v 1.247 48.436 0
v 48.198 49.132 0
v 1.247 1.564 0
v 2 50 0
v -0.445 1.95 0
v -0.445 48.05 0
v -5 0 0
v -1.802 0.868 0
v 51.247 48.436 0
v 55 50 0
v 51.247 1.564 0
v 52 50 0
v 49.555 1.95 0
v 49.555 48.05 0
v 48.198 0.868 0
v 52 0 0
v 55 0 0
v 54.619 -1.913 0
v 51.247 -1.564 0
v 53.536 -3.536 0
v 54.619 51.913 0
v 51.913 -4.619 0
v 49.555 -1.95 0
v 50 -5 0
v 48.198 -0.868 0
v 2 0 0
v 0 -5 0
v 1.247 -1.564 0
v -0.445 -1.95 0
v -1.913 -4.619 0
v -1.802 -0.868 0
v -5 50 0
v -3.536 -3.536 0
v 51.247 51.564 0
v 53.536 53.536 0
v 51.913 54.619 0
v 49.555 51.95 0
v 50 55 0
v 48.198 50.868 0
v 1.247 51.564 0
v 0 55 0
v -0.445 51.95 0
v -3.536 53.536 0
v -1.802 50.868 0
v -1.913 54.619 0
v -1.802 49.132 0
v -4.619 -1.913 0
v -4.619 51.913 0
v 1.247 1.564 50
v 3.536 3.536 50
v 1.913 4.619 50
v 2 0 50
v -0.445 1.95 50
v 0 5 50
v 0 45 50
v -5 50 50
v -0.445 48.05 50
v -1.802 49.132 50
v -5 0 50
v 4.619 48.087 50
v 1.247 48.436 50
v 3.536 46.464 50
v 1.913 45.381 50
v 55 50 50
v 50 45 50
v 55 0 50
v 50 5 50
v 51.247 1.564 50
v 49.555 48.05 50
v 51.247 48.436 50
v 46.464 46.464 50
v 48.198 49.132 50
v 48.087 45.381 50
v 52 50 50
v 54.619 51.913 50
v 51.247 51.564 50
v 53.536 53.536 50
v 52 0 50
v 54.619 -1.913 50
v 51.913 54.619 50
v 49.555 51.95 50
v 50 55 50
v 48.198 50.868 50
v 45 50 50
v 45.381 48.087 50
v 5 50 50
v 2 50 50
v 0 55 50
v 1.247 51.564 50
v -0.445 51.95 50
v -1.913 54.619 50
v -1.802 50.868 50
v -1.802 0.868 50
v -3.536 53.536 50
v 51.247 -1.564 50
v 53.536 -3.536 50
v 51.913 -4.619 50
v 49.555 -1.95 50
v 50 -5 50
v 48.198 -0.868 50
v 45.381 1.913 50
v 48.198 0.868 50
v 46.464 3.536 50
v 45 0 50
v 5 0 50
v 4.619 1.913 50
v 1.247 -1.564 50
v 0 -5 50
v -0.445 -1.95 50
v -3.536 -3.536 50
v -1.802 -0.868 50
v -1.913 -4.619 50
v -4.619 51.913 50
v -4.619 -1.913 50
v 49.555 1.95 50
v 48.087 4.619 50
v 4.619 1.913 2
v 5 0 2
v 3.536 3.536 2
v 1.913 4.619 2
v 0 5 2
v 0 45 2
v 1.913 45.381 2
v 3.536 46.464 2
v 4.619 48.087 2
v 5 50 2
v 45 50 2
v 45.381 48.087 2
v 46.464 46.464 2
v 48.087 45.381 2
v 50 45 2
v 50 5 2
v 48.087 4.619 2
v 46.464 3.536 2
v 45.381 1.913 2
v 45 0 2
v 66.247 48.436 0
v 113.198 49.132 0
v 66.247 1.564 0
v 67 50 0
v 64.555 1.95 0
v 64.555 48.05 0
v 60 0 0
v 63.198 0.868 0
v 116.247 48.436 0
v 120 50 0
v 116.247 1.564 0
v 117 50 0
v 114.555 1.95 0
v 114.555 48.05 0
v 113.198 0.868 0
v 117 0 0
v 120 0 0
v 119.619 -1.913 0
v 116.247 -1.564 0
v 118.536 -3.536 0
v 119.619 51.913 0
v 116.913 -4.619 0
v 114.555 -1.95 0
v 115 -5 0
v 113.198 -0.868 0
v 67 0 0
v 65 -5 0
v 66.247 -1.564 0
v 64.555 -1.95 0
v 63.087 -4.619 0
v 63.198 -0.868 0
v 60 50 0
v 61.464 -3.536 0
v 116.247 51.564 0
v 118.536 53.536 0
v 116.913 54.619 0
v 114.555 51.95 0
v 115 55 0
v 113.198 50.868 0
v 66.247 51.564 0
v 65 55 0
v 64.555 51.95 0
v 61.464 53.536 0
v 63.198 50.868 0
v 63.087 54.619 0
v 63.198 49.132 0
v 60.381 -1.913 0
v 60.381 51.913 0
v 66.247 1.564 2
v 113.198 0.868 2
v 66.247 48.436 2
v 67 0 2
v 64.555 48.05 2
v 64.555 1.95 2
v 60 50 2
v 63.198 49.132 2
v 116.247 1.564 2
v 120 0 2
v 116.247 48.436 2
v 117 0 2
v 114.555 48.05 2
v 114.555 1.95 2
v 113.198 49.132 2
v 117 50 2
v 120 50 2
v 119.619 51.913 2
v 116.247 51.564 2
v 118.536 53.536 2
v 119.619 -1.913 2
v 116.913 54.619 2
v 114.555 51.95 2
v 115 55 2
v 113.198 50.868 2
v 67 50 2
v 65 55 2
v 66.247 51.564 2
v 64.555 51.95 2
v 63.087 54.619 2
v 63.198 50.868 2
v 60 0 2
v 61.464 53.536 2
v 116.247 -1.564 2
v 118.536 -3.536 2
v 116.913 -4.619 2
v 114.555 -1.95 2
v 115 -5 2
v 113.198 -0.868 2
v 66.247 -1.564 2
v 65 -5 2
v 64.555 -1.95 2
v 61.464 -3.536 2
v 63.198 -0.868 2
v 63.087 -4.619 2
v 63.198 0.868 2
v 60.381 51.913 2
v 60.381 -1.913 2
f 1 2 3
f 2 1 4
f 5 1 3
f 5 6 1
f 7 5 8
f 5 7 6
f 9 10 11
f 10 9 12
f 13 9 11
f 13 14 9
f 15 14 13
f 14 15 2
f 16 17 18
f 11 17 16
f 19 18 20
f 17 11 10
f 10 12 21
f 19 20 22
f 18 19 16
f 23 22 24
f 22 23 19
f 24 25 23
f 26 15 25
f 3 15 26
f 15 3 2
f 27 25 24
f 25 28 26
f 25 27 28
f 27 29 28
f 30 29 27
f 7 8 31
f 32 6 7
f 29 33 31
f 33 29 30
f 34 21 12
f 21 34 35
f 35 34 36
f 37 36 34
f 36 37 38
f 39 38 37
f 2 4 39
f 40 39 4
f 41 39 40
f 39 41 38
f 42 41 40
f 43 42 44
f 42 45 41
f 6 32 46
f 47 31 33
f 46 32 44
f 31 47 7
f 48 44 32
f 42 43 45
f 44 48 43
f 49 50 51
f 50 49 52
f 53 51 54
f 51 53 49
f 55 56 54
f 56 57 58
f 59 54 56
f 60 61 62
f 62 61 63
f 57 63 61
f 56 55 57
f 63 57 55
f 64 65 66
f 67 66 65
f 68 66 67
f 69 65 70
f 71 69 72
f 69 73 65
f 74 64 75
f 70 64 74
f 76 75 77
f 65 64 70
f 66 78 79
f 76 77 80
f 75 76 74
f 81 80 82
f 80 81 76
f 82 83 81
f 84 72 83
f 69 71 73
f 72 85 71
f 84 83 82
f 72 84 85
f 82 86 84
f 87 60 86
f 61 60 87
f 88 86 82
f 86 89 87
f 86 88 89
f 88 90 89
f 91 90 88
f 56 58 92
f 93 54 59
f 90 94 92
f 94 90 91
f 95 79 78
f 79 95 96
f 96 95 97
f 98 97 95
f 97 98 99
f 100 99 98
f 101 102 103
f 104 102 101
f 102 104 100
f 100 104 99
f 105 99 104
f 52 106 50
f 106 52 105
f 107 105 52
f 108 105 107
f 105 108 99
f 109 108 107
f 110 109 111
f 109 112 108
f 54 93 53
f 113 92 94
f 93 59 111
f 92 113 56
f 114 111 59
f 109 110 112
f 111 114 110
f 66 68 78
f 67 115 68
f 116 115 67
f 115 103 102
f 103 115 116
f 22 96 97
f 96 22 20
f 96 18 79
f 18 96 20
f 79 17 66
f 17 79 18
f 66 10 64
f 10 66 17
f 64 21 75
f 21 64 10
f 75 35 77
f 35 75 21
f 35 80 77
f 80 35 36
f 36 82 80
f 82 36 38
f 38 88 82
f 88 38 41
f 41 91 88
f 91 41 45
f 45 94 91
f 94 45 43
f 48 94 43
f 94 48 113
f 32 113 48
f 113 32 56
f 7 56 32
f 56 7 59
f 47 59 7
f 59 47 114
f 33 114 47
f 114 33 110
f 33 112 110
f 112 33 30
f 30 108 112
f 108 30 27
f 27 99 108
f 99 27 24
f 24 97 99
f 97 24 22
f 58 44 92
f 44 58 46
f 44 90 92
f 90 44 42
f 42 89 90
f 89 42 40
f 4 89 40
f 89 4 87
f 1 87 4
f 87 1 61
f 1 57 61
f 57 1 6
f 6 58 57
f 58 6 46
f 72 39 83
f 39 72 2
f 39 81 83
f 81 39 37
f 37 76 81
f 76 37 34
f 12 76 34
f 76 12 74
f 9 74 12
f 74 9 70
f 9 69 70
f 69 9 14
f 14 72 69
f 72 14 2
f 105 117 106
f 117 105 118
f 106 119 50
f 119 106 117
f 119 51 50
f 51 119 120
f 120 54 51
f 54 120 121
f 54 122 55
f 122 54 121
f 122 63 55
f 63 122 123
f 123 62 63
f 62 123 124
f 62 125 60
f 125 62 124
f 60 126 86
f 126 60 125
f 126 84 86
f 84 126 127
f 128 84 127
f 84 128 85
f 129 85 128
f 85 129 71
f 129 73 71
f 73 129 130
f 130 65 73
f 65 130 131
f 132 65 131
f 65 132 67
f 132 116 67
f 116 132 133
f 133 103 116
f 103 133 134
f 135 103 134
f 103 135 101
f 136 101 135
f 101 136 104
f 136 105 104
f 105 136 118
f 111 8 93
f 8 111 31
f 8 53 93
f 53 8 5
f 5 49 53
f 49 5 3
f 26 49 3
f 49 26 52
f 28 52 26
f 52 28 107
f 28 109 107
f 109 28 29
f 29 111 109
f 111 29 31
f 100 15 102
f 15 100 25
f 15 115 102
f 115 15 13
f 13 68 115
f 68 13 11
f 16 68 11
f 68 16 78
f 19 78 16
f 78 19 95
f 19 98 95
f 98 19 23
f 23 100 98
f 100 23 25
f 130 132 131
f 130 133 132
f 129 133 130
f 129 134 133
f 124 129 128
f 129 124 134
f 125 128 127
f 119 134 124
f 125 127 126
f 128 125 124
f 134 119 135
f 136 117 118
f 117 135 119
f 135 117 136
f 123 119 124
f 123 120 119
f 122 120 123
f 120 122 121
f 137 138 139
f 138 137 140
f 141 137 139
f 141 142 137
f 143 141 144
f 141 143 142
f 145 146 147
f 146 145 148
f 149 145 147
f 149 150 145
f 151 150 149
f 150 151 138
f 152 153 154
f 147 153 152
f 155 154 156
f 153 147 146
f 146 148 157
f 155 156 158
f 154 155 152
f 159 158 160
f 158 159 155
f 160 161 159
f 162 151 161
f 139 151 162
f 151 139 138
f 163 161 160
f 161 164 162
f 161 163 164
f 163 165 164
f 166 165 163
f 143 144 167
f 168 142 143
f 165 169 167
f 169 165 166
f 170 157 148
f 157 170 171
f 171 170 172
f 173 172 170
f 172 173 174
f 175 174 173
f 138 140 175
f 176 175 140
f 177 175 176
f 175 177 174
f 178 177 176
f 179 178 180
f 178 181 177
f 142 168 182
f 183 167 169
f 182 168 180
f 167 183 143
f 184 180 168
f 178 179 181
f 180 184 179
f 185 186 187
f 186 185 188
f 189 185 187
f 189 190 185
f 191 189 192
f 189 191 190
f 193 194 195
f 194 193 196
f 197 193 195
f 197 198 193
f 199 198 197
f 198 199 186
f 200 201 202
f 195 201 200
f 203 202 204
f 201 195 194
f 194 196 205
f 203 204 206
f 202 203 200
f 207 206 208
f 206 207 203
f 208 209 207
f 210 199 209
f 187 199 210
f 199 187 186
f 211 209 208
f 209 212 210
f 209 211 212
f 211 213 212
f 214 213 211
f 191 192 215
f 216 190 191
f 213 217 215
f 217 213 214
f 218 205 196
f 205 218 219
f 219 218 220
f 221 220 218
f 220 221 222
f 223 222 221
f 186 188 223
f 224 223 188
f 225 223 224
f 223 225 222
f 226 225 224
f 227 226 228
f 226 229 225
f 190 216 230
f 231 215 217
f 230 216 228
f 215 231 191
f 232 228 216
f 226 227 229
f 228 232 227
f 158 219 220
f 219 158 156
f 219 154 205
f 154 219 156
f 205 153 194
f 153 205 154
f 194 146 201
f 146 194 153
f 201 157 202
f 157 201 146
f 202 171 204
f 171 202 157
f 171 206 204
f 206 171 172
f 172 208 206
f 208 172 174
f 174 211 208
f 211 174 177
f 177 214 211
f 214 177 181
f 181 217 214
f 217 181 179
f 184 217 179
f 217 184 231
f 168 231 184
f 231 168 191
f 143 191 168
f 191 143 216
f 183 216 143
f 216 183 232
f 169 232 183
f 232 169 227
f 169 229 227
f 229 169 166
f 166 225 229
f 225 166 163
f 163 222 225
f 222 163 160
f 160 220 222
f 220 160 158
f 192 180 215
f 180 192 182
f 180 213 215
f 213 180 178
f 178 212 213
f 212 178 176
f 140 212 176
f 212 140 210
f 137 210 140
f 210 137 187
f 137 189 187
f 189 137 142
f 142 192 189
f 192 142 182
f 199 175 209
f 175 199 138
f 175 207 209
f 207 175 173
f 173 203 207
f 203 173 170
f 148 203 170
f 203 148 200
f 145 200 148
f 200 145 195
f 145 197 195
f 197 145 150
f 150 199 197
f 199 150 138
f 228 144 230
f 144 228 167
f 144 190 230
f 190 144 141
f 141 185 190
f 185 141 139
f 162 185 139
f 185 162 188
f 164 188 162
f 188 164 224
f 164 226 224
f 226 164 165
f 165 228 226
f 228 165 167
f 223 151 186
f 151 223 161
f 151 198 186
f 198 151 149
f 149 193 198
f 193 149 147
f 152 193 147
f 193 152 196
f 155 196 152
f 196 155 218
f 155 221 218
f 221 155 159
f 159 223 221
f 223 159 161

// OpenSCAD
//box length
box_length = 50;

//box_breadth
box_breadth = 50;

//box height
box_height = 50;

//outer radius for rounded box
radius_outer = 5;

//radius for screw holes
radius_hole = 2;

module faceplate(l,b,r_outer,r_hole) {
	difference() {
		minkowski() {
			circle(r_outer);
			square([l,b]);
		}
		circle(r_hole);
		translate([l,0,0])circle(r_hole);
		translate([0,b,0])circle(r_hole);
		translate([l,b,0])circle(r_hole);
	}
}

module inner_shape(l,b,r_outer) {
	difference() {
		square([l,b]);
		circle(r_outer);
		translate([l,0,0])circle(r_outer);
		translate([0,b,0])circle(r_outer);
		translate([l,b,0])circle(r_outer);
	}
}

module box(l,b,h,r_outer,r_hole) {
	union() {
		linear_extrude(height = h)
		{
			difference() {
				faceplate(l,b,r_outer,r_hole);
				inner_shape(l,b,r_outer,r_hole);
			}
		}
		linear_extrude(height = 2)faceplate(l,b,r_outer,r_hole);
	}
}

box(box_length,box_breadth,box_height,radius_outer,radius_hole);
translate([box_length+2*radius_outer+5,0,0])linear_extrude(height = 2)faceplate(box_length,box_breadth,radius_outer,radius_hole);


